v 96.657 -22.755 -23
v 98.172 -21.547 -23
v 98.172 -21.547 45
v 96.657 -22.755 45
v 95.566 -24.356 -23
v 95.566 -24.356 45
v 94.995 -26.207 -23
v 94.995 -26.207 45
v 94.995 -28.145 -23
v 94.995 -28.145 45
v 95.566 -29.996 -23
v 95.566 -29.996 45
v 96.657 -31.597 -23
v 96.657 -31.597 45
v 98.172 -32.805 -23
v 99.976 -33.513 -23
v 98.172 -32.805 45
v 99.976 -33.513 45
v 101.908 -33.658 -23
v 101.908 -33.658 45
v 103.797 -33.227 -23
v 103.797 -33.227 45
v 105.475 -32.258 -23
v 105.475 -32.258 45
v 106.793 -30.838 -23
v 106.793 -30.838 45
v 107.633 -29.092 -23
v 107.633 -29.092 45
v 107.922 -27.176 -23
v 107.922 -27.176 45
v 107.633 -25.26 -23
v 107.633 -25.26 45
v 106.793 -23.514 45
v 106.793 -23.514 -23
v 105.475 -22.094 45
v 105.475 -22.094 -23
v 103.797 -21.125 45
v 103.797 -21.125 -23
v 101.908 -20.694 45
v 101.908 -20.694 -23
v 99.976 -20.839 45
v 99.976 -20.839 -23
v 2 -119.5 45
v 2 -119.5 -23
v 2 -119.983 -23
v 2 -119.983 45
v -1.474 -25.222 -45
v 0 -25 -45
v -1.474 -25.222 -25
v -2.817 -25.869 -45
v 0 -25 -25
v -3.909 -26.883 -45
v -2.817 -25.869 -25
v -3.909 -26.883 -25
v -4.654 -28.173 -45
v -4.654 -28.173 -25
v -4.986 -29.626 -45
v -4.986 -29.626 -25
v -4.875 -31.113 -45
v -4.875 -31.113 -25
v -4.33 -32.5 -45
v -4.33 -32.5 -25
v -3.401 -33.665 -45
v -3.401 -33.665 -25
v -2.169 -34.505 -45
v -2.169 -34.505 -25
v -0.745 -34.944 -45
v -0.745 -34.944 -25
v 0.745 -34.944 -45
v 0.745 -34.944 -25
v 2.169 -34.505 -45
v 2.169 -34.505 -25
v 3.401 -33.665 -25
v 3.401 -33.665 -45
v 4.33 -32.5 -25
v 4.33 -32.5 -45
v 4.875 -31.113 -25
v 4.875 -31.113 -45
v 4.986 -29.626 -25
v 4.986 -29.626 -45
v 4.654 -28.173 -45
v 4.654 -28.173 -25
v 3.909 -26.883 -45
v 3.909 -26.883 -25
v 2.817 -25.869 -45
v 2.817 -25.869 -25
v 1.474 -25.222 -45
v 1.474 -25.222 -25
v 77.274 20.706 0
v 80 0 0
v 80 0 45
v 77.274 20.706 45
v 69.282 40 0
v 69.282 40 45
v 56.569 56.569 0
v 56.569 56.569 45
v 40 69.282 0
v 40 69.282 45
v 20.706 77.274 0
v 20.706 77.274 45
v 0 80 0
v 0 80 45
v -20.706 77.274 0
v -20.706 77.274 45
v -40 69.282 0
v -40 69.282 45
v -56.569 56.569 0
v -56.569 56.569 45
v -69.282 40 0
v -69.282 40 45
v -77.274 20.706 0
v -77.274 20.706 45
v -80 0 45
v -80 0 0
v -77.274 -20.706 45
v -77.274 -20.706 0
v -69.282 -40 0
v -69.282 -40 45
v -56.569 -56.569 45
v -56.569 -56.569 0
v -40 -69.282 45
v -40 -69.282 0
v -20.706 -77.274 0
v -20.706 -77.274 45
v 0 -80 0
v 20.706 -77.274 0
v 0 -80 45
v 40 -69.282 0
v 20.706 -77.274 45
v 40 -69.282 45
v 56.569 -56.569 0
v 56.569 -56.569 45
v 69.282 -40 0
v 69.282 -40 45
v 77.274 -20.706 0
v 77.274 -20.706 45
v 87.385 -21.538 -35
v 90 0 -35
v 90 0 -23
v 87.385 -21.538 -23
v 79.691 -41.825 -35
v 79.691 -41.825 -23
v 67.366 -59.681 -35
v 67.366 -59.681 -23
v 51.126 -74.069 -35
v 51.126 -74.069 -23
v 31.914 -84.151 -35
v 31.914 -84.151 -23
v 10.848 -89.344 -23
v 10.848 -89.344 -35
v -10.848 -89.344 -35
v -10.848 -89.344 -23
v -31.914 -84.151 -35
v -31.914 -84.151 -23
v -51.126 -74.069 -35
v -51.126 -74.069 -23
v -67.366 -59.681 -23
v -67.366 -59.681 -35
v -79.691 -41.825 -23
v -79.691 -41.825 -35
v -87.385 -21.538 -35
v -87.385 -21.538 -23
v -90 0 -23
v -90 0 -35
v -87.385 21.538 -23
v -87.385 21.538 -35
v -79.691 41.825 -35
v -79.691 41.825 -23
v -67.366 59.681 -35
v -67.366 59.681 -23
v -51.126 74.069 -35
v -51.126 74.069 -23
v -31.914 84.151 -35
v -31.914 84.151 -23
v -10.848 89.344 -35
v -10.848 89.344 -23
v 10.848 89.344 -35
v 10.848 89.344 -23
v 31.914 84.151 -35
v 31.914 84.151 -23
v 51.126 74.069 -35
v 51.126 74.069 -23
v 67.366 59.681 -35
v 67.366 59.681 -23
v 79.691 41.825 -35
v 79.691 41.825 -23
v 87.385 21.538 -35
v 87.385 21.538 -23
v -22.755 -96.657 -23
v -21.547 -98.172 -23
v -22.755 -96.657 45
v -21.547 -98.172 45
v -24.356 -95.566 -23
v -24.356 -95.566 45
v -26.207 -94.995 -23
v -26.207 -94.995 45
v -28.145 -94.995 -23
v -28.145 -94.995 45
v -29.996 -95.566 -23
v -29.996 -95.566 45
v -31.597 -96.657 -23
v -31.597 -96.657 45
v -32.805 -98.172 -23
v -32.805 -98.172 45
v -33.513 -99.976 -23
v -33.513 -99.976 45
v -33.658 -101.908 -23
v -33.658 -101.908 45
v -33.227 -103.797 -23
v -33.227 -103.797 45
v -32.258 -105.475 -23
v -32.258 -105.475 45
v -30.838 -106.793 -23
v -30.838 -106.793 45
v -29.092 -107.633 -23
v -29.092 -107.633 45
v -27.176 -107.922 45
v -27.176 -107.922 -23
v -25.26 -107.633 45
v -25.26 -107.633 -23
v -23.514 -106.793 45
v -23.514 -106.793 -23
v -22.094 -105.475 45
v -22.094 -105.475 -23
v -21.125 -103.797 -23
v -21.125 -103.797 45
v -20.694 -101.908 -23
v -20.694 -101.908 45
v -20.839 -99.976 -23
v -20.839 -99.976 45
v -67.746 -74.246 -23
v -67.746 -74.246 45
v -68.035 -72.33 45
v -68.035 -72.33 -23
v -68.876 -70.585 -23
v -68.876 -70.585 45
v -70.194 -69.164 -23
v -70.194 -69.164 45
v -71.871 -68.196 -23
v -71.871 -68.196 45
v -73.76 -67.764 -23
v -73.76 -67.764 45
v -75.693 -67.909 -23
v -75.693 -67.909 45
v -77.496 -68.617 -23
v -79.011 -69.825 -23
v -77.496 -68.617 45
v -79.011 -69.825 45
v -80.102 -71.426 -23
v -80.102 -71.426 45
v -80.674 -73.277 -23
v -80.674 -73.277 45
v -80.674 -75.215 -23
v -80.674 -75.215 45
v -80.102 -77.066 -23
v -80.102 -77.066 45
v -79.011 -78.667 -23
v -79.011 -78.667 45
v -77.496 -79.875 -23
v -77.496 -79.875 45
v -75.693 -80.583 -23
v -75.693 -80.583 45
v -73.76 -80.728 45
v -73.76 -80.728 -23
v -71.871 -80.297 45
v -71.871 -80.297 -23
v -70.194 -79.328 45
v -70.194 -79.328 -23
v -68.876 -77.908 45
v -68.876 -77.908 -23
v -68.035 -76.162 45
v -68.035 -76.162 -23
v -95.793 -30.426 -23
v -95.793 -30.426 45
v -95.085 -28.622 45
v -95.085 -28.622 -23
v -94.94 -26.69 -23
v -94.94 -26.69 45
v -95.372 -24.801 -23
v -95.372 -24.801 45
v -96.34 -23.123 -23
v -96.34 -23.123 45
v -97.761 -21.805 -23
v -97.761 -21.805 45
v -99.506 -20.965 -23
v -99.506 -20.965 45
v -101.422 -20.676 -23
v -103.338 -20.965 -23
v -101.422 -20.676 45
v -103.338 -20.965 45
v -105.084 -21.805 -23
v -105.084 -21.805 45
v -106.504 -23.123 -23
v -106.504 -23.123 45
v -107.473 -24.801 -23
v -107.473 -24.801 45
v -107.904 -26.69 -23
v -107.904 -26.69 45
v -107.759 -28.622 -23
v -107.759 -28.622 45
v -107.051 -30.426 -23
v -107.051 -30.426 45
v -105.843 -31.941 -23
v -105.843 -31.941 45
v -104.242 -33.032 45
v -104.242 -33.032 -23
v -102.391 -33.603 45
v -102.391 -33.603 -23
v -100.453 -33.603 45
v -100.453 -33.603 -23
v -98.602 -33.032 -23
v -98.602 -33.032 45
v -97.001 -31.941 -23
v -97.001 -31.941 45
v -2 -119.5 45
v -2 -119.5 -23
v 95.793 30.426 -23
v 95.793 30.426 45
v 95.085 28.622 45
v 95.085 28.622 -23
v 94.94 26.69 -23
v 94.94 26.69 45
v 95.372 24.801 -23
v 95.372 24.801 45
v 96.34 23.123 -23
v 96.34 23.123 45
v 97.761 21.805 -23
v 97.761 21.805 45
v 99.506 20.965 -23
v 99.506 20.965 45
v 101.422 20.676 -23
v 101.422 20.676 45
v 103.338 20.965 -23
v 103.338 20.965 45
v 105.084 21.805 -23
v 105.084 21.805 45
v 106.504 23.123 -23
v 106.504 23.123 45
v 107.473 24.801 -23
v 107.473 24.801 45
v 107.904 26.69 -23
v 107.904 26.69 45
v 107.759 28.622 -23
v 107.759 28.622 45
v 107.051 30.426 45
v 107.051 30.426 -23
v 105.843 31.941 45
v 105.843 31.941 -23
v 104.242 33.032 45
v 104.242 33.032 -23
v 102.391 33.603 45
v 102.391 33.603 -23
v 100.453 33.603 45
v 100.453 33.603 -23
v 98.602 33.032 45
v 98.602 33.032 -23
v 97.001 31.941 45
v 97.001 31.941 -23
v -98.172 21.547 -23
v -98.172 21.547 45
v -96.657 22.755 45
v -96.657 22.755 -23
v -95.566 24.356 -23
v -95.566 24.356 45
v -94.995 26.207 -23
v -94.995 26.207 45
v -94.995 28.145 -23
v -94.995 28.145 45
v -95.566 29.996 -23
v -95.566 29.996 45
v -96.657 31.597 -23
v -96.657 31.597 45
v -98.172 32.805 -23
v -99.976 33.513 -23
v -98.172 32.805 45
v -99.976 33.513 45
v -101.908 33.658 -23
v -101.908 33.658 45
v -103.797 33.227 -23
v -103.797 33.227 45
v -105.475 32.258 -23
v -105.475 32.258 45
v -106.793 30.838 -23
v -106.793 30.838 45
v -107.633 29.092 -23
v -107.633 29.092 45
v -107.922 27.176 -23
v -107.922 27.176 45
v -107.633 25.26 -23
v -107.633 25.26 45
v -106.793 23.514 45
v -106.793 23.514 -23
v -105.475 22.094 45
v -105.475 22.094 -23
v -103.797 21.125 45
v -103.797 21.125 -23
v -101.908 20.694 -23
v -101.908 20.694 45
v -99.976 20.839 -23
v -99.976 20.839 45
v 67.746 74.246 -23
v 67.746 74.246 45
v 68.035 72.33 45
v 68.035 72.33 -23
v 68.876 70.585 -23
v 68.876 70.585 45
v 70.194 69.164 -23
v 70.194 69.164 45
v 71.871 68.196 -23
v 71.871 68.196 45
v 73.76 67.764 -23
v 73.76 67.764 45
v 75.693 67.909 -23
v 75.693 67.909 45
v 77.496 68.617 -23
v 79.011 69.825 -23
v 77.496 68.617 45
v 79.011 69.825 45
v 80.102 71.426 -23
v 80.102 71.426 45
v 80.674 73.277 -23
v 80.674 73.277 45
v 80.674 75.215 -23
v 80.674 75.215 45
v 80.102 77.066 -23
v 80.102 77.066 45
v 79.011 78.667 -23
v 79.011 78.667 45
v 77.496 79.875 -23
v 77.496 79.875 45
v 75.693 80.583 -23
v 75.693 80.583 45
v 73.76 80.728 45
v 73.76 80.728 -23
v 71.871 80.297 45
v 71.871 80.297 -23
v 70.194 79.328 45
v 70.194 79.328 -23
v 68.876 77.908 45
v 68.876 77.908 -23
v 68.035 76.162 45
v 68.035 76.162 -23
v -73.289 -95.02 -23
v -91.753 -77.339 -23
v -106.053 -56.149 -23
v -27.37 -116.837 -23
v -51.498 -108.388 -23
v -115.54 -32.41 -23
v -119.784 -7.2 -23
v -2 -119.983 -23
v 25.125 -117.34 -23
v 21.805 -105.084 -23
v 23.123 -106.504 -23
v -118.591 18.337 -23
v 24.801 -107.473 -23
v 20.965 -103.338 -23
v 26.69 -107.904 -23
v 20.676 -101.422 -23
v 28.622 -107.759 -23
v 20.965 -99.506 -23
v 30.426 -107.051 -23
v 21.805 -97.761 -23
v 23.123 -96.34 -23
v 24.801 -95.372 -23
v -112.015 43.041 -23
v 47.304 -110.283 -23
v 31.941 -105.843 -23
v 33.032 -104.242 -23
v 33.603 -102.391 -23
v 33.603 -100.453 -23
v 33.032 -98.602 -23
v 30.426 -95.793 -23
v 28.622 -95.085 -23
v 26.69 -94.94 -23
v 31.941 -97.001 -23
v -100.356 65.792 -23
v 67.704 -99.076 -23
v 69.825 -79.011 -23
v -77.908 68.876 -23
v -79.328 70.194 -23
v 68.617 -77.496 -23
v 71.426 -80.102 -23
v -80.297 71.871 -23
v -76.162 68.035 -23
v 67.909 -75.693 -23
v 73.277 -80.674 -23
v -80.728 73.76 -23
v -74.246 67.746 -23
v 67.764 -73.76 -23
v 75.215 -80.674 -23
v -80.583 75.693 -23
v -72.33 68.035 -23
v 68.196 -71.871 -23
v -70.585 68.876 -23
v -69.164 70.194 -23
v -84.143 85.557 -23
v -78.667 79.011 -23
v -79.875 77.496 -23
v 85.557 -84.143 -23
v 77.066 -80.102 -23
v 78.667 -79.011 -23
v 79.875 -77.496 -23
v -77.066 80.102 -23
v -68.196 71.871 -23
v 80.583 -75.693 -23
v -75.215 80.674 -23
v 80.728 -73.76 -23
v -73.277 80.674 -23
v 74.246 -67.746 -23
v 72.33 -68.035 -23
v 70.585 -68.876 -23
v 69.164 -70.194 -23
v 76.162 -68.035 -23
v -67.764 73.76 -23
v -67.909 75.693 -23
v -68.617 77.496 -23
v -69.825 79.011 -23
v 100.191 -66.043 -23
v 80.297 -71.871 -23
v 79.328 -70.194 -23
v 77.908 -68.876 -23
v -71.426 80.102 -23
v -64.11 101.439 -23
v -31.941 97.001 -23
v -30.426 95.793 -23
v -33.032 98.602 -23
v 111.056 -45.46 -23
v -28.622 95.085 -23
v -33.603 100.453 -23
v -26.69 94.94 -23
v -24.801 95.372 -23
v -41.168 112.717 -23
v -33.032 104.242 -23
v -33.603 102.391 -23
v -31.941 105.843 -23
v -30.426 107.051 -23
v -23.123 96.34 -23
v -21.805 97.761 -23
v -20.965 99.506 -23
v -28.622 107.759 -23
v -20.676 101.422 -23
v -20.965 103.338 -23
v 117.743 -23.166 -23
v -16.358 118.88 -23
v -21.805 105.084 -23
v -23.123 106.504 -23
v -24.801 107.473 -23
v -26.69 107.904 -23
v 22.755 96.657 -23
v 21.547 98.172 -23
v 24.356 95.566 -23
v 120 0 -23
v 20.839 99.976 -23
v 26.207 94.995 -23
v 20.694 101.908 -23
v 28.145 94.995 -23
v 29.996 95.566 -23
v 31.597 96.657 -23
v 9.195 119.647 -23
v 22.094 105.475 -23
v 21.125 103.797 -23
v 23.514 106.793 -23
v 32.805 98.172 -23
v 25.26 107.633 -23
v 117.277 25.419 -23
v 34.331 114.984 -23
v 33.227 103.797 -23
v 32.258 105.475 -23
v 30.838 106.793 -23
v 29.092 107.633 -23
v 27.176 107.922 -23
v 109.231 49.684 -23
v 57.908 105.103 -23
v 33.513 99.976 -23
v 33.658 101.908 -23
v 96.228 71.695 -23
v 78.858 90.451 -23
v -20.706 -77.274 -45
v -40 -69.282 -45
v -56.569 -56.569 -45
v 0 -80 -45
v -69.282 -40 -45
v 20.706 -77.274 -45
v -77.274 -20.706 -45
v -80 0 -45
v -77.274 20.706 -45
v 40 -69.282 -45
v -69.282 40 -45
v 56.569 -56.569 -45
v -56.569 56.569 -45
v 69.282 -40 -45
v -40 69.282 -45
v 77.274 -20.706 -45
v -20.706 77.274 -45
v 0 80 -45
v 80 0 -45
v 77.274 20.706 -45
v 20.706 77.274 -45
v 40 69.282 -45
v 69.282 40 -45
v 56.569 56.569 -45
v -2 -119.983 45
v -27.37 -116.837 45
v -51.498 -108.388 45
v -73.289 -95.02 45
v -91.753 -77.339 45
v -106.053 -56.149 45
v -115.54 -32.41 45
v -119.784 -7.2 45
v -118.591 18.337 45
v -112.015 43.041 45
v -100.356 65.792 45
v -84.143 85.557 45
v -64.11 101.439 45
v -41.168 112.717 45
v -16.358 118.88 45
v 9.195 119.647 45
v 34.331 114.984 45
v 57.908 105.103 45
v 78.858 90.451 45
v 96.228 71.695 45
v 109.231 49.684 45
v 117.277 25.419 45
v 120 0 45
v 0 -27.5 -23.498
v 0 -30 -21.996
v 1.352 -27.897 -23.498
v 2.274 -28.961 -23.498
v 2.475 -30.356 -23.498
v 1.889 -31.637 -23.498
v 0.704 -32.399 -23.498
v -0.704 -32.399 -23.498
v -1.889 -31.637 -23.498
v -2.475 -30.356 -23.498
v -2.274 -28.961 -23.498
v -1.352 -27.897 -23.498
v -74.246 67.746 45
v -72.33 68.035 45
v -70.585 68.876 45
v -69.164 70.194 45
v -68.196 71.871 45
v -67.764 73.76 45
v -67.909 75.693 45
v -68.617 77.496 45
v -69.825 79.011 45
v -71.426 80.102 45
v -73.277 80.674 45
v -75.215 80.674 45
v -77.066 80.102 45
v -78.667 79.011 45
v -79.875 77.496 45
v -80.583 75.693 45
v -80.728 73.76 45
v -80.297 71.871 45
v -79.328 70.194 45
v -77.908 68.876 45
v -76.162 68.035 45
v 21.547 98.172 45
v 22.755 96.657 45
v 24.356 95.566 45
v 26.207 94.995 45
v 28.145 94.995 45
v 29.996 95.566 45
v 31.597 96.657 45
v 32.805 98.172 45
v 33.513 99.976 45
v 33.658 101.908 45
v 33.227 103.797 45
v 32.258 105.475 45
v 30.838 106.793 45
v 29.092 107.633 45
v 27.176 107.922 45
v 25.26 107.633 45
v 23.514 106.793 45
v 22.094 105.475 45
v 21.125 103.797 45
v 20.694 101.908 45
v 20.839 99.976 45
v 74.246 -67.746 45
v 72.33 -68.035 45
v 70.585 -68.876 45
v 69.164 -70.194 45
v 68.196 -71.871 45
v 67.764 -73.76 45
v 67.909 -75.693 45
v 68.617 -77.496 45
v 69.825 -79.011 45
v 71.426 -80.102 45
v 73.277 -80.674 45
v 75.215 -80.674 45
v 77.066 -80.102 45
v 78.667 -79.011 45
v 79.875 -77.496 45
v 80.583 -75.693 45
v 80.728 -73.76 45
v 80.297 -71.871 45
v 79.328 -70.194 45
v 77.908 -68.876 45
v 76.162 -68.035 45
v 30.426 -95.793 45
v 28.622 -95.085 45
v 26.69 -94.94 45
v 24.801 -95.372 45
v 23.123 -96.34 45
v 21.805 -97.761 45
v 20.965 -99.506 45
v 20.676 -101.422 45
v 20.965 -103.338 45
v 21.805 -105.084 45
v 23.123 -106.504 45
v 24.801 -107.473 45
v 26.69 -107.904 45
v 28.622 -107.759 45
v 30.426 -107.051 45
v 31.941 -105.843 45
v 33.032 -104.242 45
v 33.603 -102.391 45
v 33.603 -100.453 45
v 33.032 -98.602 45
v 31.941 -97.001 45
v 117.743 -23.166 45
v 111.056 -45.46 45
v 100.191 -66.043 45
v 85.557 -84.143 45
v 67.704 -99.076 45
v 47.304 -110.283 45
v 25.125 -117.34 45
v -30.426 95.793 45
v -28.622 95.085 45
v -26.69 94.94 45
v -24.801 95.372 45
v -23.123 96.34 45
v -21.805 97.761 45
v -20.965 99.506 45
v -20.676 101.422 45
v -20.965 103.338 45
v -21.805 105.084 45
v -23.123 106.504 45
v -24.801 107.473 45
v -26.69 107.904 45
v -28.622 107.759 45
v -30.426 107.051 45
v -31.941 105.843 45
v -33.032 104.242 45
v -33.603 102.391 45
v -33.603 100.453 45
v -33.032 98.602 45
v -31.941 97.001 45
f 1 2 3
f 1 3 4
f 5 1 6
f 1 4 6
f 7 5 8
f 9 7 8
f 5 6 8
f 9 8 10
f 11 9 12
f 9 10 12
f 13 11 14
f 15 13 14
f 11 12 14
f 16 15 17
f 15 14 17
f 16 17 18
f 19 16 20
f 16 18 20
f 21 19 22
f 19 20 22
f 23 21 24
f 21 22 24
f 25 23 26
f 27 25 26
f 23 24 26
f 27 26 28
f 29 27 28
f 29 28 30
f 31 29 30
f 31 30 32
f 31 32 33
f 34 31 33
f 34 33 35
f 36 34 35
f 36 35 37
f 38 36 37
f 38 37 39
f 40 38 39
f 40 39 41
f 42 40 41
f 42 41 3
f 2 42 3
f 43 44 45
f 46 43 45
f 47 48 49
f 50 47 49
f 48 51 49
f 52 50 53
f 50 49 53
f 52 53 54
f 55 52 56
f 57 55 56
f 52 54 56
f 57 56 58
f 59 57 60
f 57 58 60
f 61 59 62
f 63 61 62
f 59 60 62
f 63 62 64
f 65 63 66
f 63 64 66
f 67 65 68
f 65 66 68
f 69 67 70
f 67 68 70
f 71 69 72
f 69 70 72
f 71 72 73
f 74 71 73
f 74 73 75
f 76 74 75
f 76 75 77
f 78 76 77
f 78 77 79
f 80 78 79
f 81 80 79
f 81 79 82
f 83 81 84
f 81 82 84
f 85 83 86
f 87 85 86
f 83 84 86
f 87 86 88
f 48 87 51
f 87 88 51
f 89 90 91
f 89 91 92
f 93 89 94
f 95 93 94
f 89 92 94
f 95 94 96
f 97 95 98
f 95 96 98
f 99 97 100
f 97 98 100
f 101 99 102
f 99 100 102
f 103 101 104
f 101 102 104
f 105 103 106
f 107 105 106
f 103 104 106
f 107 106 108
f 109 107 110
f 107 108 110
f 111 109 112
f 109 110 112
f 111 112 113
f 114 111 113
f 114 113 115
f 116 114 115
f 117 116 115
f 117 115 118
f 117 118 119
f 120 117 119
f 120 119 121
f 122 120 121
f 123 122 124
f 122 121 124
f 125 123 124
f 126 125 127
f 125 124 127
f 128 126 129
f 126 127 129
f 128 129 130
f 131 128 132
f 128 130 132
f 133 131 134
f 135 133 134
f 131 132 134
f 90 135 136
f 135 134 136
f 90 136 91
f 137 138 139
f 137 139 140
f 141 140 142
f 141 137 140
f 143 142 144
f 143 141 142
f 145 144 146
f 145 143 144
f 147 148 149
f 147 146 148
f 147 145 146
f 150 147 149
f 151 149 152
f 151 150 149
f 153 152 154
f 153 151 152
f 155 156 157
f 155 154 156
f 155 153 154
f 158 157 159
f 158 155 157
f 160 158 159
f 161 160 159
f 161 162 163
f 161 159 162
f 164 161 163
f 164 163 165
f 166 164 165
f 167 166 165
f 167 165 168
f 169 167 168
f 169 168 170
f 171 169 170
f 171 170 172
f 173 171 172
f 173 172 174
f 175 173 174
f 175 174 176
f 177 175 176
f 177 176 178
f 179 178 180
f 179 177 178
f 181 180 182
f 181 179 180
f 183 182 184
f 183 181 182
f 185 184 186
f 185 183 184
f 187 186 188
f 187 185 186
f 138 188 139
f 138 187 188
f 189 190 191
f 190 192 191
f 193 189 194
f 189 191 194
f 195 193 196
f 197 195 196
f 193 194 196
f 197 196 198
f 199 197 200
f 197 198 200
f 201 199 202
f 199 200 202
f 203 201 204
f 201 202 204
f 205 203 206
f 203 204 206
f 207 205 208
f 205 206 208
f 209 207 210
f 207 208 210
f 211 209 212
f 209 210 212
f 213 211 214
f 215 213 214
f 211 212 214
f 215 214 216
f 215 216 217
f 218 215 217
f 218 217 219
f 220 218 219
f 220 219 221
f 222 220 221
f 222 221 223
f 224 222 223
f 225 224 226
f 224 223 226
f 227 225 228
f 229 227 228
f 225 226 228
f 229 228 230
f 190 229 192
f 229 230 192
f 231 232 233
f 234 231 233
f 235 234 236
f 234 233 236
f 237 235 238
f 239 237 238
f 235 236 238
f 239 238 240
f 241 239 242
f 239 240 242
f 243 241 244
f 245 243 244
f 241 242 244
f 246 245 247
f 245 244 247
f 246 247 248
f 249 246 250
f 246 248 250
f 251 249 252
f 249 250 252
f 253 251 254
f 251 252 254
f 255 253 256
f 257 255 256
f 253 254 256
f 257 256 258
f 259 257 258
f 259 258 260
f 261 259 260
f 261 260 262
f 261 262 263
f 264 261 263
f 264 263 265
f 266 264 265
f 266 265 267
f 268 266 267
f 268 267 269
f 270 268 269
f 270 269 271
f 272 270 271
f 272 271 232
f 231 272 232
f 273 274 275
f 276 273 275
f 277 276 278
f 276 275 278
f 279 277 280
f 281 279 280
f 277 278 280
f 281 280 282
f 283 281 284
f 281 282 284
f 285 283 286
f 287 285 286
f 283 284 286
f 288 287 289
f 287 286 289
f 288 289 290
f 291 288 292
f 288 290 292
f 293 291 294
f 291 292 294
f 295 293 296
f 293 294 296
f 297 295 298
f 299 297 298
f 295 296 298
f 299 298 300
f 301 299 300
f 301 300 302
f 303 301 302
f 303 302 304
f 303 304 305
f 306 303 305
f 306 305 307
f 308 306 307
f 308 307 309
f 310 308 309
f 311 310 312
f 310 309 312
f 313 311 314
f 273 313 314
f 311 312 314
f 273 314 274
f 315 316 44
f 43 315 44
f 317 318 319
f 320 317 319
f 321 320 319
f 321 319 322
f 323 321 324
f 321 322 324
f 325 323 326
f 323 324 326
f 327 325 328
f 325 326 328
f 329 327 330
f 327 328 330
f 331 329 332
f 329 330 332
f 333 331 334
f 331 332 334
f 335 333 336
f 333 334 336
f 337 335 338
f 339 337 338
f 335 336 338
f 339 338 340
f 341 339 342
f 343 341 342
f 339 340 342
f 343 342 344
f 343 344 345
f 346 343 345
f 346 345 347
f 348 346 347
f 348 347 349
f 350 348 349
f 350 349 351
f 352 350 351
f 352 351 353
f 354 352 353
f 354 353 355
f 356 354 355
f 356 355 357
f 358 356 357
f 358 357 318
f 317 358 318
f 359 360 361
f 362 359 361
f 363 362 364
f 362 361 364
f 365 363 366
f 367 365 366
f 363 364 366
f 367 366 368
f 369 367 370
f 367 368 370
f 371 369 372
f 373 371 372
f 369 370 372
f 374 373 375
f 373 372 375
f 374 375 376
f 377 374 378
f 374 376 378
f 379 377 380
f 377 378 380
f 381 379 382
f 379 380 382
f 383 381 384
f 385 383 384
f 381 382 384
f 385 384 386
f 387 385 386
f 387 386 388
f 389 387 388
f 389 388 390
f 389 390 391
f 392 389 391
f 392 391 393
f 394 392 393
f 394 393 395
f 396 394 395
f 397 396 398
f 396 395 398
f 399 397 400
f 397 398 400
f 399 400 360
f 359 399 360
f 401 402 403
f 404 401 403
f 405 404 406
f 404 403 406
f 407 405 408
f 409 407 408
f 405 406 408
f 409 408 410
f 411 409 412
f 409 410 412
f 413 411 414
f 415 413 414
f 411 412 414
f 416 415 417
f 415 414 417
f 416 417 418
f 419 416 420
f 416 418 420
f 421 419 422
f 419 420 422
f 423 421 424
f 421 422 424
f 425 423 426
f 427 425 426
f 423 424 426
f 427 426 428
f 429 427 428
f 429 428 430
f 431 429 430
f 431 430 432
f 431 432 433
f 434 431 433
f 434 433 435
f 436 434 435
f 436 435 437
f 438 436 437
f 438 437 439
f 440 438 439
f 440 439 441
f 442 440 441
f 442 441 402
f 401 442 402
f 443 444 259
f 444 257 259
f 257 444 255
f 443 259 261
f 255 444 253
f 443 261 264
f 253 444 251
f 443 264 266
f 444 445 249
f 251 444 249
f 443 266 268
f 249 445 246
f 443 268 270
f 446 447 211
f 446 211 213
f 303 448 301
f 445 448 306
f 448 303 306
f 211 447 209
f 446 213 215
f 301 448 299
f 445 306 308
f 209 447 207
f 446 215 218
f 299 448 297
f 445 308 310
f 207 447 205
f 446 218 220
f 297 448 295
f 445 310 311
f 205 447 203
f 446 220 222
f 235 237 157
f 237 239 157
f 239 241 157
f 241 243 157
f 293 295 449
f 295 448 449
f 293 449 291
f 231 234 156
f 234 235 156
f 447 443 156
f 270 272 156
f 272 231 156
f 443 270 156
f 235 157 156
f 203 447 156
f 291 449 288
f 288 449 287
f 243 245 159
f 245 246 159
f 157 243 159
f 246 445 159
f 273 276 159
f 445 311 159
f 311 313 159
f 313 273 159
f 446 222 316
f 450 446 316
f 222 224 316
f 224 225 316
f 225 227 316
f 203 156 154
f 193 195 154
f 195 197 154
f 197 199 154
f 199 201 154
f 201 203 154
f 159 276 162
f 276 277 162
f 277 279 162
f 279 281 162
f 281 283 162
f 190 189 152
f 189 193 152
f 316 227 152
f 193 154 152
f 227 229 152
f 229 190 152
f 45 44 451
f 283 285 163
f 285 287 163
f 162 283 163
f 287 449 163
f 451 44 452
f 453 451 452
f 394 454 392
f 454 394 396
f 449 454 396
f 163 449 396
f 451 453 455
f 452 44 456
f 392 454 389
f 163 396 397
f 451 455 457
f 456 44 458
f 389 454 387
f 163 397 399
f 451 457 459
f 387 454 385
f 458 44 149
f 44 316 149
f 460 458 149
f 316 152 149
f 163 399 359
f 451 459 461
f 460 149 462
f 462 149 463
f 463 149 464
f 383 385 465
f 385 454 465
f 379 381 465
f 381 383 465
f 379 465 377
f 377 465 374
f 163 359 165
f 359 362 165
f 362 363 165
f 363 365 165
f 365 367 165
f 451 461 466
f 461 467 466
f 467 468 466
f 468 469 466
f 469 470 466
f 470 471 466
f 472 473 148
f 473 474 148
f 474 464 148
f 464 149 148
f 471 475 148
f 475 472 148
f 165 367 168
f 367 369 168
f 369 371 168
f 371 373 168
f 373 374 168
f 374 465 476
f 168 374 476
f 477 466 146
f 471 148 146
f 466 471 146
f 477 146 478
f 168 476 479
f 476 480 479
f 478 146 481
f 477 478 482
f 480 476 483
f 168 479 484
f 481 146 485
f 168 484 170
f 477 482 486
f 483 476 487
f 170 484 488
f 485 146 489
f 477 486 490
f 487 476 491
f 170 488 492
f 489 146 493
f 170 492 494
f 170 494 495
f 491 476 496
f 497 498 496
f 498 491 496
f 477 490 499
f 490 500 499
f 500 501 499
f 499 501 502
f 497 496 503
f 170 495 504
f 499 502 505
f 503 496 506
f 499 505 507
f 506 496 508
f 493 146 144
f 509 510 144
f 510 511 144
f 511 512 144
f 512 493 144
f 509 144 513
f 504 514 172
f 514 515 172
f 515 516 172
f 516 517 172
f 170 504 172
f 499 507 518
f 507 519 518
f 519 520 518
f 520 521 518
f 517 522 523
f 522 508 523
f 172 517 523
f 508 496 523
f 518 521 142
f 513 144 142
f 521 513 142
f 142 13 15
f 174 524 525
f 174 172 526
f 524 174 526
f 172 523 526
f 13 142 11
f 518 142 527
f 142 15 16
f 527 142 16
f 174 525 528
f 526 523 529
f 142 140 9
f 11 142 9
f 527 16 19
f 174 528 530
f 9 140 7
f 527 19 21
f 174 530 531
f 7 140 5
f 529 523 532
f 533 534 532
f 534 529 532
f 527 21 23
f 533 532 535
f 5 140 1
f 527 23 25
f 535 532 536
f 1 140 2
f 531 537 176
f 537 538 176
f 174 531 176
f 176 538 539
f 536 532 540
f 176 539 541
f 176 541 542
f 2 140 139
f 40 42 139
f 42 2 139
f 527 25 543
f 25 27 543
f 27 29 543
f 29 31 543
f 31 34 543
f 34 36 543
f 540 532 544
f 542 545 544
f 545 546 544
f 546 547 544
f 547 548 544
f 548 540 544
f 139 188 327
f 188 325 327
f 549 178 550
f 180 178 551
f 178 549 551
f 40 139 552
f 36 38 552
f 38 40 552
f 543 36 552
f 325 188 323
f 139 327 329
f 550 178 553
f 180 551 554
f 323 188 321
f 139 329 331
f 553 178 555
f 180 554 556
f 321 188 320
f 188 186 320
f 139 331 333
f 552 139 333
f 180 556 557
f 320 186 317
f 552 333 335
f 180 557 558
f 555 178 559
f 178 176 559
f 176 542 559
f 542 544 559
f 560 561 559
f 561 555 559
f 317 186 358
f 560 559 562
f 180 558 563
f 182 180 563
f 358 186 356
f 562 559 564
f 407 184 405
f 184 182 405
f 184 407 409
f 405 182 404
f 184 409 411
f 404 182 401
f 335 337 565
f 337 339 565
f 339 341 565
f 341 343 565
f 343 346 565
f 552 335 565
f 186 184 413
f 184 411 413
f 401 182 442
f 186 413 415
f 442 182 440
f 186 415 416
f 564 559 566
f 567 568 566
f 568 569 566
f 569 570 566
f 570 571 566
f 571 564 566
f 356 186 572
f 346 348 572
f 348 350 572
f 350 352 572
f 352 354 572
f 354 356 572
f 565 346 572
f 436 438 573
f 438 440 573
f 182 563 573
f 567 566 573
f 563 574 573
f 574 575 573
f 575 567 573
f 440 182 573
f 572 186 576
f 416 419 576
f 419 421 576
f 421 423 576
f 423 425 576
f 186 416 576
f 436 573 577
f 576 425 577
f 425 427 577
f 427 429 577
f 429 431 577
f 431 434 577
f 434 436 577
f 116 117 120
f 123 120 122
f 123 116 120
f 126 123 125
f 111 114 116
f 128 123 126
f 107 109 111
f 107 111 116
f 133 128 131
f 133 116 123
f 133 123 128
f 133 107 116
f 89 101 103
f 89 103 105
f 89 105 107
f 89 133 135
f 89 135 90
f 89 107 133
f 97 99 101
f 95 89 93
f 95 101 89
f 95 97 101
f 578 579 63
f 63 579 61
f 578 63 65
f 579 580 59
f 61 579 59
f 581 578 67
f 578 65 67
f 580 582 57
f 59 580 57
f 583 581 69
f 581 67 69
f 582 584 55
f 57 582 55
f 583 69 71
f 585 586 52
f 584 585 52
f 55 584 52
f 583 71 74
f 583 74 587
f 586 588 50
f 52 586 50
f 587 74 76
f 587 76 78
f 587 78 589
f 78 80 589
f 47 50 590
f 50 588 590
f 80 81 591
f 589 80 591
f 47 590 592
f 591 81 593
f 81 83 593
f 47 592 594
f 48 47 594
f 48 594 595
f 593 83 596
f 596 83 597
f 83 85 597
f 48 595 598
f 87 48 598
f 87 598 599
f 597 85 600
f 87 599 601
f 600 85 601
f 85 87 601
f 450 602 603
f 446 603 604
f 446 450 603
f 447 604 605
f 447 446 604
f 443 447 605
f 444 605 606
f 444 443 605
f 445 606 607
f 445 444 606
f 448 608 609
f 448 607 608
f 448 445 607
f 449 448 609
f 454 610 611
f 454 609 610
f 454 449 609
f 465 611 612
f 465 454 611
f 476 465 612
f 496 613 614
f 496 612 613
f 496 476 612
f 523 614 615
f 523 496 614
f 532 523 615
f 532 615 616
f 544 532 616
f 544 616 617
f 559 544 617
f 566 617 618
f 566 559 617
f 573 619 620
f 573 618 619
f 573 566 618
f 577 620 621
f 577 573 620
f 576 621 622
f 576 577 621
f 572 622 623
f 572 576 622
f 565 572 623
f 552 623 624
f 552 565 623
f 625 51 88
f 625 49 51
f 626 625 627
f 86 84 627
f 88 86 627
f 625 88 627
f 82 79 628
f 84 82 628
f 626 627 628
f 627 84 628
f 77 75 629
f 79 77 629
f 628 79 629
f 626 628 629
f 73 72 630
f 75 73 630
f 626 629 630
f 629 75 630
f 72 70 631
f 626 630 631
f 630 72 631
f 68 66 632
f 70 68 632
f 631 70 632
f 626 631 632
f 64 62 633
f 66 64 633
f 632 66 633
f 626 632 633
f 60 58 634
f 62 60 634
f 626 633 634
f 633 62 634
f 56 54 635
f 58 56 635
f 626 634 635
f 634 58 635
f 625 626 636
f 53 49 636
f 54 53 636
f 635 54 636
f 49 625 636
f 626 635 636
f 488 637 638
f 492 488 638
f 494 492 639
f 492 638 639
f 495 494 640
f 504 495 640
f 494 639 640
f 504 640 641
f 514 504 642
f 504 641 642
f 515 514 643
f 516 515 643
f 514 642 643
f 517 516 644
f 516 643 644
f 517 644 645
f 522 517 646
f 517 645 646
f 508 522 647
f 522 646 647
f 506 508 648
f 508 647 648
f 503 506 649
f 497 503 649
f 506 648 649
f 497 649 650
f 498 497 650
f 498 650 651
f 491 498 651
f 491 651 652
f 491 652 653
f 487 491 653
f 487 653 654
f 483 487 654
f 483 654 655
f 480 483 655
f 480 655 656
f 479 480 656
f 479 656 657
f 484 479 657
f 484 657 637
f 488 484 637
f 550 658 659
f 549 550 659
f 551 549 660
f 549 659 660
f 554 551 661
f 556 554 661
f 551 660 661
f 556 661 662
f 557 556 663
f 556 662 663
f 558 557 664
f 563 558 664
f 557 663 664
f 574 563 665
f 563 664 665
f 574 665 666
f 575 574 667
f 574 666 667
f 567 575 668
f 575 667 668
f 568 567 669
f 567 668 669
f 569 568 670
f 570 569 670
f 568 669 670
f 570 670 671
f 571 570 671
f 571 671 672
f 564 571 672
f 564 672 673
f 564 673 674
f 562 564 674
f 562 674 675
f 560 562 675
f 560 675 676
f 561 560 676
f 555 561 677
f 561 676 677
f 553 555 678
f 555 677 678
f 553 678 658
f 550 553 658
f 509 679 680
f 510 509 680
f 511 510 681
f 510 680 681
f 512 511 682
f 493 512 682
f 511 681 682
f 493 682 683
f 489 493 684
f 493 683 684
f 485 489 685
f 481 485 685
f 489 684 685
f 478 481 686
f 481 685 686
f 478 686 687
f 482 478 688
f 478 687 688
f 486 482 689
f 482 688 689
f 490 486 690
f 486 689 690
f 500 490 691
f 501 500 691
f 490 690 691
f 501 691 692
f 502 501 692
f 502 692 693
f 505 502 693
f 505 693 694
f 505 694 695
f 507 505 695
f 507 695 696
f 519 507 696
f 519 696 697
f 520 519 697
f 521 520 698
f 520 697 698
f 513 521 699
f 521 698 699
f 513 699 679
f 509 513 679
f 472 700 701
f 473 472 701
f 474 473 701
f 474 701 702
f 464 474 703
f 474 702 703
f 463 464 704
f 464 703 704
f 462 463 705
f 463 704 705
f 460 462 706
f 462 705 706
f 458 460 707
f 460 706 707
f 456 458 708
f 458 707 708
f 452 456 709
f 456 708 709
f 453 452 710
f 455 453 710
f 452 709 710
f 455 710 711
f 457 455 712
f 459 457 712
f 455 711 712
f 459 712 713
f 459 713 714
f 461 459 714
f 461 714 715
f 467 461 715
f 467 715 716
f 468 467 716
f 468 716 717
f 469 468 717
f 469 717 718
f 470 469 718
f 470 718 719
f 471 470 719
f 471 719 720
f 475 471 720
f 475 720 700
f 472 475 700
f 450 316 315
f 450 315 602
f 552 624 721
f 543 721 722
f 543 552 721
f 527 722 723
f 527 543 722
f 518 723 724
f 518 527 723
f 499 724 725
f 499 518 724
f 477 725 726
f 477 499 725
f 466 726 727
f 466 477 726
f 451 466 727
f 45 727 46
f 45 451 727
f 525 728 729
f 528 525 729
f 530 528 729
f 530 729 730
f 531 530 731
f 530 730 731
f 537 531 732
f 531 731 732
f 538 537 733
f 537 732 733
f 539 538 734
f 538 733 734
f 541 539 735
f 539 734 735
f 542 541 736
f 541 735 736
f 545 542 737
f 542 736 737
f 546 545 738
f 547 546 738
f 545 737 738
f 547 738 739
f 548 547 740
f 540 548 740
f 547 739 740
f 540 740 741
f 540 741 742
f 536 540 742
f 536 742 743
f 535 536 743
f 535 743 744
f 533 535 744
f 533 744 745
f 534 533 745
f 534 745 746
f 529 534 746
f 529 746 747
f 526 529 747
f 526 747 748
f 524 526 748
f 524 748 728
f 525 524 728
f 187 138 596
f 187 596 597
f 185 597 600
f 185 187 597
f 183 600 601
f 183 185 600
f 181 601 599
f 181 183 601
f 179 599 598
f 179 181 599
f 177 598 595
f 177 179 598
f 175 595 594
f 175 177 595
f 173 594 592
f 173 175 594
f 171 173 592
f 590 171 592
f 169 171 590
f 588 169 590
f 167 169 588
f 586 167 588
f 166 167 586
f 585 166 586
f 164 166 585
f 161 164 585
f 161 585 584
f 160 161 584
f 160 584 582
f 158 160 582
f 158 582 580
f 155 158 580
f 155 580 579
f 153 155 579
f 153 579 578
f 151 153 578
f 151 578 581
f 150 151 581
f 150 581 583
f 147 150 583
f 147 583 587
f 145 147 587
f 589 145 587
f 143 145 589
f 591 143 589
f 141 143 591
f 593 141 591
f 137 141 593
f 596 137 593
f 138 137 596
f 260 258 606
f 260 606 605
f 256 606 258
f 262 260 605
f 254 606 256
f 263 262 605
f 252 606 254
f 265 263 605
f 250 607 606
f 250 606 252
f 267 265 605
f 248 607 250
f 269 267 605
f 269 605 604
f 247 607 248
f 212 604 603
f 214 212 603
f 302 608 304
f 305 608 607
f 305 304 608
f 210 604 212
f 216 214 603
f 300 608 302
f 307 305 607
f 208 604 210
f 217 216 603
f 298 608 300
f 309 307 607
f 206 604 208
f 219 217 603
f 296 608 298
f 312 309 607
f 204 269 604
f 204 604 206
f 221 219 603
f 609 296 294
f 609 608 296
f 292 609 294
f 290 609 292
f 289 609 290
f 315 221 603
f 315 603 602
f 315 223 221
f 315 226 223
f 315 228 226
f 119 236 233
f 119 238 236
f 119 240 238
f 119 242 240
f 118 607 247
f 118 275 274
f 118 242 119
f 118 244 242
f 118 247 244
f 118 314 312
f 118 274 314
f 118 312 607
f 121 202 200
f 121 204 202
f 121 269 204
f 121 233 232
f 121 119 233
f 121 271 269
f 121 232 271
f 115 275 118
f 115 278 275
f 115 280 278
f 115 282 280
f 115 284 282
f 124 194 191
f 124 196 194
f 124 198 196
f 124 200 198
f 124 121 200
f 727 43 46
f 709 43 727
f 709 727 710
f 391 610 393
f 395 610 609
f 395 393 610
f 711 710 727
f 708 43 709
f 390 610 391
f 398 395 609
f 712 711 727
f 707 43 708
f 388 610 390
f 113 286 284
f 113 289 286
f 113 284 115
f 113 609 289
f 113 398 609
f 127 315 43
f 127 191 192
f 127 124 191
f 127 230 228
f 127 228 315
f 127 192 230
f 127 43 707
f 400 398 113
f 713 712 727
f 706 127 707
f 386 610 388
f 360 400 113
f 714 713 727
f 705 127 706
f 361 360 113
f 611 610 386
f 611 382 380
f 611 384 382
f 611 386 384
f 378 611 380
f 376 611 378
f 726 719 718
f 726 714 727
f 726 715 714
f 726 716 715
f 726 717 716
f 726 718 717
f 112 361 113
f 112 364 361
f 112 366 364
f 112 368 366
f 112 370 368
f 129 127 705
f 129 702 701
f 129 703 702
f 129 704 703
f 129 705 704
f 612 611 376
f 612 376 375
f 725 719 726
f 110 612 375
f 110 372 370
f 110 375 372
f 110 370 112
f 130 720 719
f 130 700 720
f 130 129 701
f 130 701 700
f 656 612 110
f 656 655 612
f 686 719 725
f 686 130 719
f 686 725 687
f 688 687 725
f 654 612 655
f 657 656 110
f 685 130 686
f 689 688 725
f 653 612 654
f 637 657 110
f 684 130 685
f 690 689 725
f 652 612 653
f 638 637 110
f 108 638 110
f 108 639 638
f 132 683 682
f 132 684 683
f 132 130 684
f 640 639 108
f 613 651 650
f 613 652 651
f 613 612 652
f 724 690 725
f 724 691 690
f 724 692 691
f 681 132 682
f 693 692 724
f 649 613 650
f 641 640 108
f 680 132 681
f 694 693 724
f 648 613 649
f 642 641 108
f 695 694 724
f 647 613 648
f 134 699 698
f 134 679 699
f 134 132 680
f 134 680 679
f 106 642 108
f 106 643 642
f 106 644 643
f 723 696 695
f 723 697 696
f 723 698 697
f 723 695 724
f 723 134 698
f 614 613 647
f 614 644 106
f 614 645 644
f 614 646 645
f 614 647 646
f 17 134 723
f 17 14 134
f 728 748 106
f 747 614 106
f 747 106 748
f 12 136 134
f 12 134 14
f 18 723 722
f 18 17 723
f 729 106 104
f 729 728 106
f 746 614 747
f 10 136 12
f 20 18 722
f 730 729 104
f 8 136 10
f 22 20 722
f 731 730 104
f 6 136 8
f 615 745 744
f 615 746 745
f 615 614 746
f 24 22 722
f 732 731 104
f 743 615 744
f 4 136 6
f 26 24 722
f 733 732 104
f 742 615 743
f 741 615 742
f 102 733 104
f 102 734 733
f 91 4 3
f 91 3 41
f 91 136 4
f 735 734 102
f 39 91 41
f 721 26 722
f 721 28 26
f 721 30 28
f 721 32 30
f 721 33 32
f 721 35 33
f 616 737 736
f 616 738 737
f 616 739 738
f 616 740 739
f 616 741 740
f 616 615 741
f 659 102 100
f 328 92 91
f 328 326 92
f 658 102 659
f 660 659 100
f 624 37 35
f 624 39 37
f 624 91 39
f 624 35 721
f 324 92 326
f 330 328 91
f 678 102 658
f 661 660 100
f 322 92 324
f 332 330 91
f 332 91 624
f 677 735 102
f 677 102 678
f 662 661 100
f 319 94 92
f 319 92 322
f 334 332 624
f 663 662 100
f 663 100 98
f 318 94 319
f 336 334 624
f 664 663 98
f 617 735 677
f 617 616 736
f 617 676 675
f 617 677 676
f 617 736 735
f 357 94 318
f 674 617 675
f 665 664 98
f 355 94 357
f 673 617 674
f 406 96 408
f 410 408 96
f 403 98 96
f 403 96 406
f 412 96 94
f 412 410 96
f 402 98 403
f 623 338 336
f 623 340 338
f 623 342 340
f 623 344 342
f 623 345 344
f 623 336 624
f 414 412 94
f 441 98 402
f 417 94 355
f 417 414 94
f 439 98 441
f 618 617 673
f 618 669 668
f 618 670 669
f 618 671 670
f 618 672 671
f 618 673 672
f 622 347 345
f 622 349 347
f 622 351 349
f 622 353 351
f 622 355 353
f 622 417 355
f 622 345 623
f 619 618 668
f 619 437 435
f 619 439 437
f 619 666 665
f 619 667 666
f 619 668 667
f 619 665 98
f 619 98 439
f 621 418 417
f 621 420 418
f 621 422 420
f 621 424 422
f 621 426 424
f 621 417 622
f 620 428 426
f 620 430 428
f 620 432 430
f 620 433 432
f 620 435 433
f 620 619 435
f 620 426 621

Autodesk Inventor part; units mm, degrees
ref_plane "YZ Plane" through (0, 0, 0) normal (1, 0, 0) x (0, 1, 0)
ref_plane "XZ Plane" through (0, 0, 0) normal (0, 1, 0) x (-1, 0, 0)
ref_plane "XY Plane" through (0, 0, 0) normal (0, 0, 1) x (1, 0, 0)
sketch "Sketch1" plane through (-446.9925, -258.9913, -45) normal (0, 0, 1) x (1, 0, 0)
  point P0 (521.2387, 184.7451)
sketch "Sketch2" plane through (-446.9925, -258.9913, -45) normal (0, 0, 1) x (1, 0, 0)
  circle A0 centre (446.9925, 258.9913) radius 120
  dimension "d43" = 240
extrude "ExtrusionBlind1" add sketch "Sketch2" along normal blind 90
sketch "Sketch3" plane through (-446.9925, -258.9913, -45) normal (0, 0, 1) x (1, 0, 0)
  circle A0 centre (446.9925, 258.9913) radius 143.9167
  circle A1 centre (446.9925, 258.9913) radius 90
  circle A2 centre (446.9925, 258.9913) radius 120 projected
  dimension "d44" = 287.8334
  dimension "d45" = 180
extrude "ExtrusionBlind2" cut sketch "Sketch3" along normal blind 22 contours A0 | A2
hole "Hole1" at (74.2462, -74.2462, -45) direction (0, 0, 1) diameter 13 end through all
pattern_circular "PolarArray1" count 12 over 360 about axis through (0, 0, -45) along (0, 0, 1) of "Hole1", "Hole1"
sketch "Sketch6" plane through (0, 0, -45) normal (0, 0, -1) x (-1, 0, 0)
  point P0 (0, -30)
sketch "Sketch7" plane through (0, 0, -45) normal (0, 0, -1) x (-1, 0, 0)
  point P0 (-22.5, 5.5)
sketch "Sketch8" plane through (0, 0, 45) normal (0, 0, 1) x (1, 0, 0)
  circle A0 centre (0, 0) radius 80
  circle A1 centre (0, 0) radius 120 projected
  dimension "d42" = 160
extrude "ExtrusionBlind3" cut sketch "Sketch8" against normal blind 45 contours A0
chamfer "Chamfer1" distance 10 angle 45 1 edges at (-90, 0, -45)
hole "Hole2" at (0, -30, -45) direction (0, 0, 1) diameter 10 depth 20 tip angle 118
hole "Hole3" [suppressed]
sketch "Sketch12" plane through (0, 0, -45) normal (0, 0, -1) x (-1, 0, 0)
  line L0 (-2, -119.5) -> (-2, -141.4896)
  line L1 (-2, -141.4896) -> (2, -141.4896)
  line L2 (2, -119.5) -> (2, -141.4896)
  line L3 (2, -119.5) -> (-2, -119.5)
  dimension "d46" = 4
  dimension "d47" = 21.9896
extrude "ExtrusionThru1" cut sketch "Sketch12" against normal through all
properties part number "XL200 PART1" material "Steel, Mild"
